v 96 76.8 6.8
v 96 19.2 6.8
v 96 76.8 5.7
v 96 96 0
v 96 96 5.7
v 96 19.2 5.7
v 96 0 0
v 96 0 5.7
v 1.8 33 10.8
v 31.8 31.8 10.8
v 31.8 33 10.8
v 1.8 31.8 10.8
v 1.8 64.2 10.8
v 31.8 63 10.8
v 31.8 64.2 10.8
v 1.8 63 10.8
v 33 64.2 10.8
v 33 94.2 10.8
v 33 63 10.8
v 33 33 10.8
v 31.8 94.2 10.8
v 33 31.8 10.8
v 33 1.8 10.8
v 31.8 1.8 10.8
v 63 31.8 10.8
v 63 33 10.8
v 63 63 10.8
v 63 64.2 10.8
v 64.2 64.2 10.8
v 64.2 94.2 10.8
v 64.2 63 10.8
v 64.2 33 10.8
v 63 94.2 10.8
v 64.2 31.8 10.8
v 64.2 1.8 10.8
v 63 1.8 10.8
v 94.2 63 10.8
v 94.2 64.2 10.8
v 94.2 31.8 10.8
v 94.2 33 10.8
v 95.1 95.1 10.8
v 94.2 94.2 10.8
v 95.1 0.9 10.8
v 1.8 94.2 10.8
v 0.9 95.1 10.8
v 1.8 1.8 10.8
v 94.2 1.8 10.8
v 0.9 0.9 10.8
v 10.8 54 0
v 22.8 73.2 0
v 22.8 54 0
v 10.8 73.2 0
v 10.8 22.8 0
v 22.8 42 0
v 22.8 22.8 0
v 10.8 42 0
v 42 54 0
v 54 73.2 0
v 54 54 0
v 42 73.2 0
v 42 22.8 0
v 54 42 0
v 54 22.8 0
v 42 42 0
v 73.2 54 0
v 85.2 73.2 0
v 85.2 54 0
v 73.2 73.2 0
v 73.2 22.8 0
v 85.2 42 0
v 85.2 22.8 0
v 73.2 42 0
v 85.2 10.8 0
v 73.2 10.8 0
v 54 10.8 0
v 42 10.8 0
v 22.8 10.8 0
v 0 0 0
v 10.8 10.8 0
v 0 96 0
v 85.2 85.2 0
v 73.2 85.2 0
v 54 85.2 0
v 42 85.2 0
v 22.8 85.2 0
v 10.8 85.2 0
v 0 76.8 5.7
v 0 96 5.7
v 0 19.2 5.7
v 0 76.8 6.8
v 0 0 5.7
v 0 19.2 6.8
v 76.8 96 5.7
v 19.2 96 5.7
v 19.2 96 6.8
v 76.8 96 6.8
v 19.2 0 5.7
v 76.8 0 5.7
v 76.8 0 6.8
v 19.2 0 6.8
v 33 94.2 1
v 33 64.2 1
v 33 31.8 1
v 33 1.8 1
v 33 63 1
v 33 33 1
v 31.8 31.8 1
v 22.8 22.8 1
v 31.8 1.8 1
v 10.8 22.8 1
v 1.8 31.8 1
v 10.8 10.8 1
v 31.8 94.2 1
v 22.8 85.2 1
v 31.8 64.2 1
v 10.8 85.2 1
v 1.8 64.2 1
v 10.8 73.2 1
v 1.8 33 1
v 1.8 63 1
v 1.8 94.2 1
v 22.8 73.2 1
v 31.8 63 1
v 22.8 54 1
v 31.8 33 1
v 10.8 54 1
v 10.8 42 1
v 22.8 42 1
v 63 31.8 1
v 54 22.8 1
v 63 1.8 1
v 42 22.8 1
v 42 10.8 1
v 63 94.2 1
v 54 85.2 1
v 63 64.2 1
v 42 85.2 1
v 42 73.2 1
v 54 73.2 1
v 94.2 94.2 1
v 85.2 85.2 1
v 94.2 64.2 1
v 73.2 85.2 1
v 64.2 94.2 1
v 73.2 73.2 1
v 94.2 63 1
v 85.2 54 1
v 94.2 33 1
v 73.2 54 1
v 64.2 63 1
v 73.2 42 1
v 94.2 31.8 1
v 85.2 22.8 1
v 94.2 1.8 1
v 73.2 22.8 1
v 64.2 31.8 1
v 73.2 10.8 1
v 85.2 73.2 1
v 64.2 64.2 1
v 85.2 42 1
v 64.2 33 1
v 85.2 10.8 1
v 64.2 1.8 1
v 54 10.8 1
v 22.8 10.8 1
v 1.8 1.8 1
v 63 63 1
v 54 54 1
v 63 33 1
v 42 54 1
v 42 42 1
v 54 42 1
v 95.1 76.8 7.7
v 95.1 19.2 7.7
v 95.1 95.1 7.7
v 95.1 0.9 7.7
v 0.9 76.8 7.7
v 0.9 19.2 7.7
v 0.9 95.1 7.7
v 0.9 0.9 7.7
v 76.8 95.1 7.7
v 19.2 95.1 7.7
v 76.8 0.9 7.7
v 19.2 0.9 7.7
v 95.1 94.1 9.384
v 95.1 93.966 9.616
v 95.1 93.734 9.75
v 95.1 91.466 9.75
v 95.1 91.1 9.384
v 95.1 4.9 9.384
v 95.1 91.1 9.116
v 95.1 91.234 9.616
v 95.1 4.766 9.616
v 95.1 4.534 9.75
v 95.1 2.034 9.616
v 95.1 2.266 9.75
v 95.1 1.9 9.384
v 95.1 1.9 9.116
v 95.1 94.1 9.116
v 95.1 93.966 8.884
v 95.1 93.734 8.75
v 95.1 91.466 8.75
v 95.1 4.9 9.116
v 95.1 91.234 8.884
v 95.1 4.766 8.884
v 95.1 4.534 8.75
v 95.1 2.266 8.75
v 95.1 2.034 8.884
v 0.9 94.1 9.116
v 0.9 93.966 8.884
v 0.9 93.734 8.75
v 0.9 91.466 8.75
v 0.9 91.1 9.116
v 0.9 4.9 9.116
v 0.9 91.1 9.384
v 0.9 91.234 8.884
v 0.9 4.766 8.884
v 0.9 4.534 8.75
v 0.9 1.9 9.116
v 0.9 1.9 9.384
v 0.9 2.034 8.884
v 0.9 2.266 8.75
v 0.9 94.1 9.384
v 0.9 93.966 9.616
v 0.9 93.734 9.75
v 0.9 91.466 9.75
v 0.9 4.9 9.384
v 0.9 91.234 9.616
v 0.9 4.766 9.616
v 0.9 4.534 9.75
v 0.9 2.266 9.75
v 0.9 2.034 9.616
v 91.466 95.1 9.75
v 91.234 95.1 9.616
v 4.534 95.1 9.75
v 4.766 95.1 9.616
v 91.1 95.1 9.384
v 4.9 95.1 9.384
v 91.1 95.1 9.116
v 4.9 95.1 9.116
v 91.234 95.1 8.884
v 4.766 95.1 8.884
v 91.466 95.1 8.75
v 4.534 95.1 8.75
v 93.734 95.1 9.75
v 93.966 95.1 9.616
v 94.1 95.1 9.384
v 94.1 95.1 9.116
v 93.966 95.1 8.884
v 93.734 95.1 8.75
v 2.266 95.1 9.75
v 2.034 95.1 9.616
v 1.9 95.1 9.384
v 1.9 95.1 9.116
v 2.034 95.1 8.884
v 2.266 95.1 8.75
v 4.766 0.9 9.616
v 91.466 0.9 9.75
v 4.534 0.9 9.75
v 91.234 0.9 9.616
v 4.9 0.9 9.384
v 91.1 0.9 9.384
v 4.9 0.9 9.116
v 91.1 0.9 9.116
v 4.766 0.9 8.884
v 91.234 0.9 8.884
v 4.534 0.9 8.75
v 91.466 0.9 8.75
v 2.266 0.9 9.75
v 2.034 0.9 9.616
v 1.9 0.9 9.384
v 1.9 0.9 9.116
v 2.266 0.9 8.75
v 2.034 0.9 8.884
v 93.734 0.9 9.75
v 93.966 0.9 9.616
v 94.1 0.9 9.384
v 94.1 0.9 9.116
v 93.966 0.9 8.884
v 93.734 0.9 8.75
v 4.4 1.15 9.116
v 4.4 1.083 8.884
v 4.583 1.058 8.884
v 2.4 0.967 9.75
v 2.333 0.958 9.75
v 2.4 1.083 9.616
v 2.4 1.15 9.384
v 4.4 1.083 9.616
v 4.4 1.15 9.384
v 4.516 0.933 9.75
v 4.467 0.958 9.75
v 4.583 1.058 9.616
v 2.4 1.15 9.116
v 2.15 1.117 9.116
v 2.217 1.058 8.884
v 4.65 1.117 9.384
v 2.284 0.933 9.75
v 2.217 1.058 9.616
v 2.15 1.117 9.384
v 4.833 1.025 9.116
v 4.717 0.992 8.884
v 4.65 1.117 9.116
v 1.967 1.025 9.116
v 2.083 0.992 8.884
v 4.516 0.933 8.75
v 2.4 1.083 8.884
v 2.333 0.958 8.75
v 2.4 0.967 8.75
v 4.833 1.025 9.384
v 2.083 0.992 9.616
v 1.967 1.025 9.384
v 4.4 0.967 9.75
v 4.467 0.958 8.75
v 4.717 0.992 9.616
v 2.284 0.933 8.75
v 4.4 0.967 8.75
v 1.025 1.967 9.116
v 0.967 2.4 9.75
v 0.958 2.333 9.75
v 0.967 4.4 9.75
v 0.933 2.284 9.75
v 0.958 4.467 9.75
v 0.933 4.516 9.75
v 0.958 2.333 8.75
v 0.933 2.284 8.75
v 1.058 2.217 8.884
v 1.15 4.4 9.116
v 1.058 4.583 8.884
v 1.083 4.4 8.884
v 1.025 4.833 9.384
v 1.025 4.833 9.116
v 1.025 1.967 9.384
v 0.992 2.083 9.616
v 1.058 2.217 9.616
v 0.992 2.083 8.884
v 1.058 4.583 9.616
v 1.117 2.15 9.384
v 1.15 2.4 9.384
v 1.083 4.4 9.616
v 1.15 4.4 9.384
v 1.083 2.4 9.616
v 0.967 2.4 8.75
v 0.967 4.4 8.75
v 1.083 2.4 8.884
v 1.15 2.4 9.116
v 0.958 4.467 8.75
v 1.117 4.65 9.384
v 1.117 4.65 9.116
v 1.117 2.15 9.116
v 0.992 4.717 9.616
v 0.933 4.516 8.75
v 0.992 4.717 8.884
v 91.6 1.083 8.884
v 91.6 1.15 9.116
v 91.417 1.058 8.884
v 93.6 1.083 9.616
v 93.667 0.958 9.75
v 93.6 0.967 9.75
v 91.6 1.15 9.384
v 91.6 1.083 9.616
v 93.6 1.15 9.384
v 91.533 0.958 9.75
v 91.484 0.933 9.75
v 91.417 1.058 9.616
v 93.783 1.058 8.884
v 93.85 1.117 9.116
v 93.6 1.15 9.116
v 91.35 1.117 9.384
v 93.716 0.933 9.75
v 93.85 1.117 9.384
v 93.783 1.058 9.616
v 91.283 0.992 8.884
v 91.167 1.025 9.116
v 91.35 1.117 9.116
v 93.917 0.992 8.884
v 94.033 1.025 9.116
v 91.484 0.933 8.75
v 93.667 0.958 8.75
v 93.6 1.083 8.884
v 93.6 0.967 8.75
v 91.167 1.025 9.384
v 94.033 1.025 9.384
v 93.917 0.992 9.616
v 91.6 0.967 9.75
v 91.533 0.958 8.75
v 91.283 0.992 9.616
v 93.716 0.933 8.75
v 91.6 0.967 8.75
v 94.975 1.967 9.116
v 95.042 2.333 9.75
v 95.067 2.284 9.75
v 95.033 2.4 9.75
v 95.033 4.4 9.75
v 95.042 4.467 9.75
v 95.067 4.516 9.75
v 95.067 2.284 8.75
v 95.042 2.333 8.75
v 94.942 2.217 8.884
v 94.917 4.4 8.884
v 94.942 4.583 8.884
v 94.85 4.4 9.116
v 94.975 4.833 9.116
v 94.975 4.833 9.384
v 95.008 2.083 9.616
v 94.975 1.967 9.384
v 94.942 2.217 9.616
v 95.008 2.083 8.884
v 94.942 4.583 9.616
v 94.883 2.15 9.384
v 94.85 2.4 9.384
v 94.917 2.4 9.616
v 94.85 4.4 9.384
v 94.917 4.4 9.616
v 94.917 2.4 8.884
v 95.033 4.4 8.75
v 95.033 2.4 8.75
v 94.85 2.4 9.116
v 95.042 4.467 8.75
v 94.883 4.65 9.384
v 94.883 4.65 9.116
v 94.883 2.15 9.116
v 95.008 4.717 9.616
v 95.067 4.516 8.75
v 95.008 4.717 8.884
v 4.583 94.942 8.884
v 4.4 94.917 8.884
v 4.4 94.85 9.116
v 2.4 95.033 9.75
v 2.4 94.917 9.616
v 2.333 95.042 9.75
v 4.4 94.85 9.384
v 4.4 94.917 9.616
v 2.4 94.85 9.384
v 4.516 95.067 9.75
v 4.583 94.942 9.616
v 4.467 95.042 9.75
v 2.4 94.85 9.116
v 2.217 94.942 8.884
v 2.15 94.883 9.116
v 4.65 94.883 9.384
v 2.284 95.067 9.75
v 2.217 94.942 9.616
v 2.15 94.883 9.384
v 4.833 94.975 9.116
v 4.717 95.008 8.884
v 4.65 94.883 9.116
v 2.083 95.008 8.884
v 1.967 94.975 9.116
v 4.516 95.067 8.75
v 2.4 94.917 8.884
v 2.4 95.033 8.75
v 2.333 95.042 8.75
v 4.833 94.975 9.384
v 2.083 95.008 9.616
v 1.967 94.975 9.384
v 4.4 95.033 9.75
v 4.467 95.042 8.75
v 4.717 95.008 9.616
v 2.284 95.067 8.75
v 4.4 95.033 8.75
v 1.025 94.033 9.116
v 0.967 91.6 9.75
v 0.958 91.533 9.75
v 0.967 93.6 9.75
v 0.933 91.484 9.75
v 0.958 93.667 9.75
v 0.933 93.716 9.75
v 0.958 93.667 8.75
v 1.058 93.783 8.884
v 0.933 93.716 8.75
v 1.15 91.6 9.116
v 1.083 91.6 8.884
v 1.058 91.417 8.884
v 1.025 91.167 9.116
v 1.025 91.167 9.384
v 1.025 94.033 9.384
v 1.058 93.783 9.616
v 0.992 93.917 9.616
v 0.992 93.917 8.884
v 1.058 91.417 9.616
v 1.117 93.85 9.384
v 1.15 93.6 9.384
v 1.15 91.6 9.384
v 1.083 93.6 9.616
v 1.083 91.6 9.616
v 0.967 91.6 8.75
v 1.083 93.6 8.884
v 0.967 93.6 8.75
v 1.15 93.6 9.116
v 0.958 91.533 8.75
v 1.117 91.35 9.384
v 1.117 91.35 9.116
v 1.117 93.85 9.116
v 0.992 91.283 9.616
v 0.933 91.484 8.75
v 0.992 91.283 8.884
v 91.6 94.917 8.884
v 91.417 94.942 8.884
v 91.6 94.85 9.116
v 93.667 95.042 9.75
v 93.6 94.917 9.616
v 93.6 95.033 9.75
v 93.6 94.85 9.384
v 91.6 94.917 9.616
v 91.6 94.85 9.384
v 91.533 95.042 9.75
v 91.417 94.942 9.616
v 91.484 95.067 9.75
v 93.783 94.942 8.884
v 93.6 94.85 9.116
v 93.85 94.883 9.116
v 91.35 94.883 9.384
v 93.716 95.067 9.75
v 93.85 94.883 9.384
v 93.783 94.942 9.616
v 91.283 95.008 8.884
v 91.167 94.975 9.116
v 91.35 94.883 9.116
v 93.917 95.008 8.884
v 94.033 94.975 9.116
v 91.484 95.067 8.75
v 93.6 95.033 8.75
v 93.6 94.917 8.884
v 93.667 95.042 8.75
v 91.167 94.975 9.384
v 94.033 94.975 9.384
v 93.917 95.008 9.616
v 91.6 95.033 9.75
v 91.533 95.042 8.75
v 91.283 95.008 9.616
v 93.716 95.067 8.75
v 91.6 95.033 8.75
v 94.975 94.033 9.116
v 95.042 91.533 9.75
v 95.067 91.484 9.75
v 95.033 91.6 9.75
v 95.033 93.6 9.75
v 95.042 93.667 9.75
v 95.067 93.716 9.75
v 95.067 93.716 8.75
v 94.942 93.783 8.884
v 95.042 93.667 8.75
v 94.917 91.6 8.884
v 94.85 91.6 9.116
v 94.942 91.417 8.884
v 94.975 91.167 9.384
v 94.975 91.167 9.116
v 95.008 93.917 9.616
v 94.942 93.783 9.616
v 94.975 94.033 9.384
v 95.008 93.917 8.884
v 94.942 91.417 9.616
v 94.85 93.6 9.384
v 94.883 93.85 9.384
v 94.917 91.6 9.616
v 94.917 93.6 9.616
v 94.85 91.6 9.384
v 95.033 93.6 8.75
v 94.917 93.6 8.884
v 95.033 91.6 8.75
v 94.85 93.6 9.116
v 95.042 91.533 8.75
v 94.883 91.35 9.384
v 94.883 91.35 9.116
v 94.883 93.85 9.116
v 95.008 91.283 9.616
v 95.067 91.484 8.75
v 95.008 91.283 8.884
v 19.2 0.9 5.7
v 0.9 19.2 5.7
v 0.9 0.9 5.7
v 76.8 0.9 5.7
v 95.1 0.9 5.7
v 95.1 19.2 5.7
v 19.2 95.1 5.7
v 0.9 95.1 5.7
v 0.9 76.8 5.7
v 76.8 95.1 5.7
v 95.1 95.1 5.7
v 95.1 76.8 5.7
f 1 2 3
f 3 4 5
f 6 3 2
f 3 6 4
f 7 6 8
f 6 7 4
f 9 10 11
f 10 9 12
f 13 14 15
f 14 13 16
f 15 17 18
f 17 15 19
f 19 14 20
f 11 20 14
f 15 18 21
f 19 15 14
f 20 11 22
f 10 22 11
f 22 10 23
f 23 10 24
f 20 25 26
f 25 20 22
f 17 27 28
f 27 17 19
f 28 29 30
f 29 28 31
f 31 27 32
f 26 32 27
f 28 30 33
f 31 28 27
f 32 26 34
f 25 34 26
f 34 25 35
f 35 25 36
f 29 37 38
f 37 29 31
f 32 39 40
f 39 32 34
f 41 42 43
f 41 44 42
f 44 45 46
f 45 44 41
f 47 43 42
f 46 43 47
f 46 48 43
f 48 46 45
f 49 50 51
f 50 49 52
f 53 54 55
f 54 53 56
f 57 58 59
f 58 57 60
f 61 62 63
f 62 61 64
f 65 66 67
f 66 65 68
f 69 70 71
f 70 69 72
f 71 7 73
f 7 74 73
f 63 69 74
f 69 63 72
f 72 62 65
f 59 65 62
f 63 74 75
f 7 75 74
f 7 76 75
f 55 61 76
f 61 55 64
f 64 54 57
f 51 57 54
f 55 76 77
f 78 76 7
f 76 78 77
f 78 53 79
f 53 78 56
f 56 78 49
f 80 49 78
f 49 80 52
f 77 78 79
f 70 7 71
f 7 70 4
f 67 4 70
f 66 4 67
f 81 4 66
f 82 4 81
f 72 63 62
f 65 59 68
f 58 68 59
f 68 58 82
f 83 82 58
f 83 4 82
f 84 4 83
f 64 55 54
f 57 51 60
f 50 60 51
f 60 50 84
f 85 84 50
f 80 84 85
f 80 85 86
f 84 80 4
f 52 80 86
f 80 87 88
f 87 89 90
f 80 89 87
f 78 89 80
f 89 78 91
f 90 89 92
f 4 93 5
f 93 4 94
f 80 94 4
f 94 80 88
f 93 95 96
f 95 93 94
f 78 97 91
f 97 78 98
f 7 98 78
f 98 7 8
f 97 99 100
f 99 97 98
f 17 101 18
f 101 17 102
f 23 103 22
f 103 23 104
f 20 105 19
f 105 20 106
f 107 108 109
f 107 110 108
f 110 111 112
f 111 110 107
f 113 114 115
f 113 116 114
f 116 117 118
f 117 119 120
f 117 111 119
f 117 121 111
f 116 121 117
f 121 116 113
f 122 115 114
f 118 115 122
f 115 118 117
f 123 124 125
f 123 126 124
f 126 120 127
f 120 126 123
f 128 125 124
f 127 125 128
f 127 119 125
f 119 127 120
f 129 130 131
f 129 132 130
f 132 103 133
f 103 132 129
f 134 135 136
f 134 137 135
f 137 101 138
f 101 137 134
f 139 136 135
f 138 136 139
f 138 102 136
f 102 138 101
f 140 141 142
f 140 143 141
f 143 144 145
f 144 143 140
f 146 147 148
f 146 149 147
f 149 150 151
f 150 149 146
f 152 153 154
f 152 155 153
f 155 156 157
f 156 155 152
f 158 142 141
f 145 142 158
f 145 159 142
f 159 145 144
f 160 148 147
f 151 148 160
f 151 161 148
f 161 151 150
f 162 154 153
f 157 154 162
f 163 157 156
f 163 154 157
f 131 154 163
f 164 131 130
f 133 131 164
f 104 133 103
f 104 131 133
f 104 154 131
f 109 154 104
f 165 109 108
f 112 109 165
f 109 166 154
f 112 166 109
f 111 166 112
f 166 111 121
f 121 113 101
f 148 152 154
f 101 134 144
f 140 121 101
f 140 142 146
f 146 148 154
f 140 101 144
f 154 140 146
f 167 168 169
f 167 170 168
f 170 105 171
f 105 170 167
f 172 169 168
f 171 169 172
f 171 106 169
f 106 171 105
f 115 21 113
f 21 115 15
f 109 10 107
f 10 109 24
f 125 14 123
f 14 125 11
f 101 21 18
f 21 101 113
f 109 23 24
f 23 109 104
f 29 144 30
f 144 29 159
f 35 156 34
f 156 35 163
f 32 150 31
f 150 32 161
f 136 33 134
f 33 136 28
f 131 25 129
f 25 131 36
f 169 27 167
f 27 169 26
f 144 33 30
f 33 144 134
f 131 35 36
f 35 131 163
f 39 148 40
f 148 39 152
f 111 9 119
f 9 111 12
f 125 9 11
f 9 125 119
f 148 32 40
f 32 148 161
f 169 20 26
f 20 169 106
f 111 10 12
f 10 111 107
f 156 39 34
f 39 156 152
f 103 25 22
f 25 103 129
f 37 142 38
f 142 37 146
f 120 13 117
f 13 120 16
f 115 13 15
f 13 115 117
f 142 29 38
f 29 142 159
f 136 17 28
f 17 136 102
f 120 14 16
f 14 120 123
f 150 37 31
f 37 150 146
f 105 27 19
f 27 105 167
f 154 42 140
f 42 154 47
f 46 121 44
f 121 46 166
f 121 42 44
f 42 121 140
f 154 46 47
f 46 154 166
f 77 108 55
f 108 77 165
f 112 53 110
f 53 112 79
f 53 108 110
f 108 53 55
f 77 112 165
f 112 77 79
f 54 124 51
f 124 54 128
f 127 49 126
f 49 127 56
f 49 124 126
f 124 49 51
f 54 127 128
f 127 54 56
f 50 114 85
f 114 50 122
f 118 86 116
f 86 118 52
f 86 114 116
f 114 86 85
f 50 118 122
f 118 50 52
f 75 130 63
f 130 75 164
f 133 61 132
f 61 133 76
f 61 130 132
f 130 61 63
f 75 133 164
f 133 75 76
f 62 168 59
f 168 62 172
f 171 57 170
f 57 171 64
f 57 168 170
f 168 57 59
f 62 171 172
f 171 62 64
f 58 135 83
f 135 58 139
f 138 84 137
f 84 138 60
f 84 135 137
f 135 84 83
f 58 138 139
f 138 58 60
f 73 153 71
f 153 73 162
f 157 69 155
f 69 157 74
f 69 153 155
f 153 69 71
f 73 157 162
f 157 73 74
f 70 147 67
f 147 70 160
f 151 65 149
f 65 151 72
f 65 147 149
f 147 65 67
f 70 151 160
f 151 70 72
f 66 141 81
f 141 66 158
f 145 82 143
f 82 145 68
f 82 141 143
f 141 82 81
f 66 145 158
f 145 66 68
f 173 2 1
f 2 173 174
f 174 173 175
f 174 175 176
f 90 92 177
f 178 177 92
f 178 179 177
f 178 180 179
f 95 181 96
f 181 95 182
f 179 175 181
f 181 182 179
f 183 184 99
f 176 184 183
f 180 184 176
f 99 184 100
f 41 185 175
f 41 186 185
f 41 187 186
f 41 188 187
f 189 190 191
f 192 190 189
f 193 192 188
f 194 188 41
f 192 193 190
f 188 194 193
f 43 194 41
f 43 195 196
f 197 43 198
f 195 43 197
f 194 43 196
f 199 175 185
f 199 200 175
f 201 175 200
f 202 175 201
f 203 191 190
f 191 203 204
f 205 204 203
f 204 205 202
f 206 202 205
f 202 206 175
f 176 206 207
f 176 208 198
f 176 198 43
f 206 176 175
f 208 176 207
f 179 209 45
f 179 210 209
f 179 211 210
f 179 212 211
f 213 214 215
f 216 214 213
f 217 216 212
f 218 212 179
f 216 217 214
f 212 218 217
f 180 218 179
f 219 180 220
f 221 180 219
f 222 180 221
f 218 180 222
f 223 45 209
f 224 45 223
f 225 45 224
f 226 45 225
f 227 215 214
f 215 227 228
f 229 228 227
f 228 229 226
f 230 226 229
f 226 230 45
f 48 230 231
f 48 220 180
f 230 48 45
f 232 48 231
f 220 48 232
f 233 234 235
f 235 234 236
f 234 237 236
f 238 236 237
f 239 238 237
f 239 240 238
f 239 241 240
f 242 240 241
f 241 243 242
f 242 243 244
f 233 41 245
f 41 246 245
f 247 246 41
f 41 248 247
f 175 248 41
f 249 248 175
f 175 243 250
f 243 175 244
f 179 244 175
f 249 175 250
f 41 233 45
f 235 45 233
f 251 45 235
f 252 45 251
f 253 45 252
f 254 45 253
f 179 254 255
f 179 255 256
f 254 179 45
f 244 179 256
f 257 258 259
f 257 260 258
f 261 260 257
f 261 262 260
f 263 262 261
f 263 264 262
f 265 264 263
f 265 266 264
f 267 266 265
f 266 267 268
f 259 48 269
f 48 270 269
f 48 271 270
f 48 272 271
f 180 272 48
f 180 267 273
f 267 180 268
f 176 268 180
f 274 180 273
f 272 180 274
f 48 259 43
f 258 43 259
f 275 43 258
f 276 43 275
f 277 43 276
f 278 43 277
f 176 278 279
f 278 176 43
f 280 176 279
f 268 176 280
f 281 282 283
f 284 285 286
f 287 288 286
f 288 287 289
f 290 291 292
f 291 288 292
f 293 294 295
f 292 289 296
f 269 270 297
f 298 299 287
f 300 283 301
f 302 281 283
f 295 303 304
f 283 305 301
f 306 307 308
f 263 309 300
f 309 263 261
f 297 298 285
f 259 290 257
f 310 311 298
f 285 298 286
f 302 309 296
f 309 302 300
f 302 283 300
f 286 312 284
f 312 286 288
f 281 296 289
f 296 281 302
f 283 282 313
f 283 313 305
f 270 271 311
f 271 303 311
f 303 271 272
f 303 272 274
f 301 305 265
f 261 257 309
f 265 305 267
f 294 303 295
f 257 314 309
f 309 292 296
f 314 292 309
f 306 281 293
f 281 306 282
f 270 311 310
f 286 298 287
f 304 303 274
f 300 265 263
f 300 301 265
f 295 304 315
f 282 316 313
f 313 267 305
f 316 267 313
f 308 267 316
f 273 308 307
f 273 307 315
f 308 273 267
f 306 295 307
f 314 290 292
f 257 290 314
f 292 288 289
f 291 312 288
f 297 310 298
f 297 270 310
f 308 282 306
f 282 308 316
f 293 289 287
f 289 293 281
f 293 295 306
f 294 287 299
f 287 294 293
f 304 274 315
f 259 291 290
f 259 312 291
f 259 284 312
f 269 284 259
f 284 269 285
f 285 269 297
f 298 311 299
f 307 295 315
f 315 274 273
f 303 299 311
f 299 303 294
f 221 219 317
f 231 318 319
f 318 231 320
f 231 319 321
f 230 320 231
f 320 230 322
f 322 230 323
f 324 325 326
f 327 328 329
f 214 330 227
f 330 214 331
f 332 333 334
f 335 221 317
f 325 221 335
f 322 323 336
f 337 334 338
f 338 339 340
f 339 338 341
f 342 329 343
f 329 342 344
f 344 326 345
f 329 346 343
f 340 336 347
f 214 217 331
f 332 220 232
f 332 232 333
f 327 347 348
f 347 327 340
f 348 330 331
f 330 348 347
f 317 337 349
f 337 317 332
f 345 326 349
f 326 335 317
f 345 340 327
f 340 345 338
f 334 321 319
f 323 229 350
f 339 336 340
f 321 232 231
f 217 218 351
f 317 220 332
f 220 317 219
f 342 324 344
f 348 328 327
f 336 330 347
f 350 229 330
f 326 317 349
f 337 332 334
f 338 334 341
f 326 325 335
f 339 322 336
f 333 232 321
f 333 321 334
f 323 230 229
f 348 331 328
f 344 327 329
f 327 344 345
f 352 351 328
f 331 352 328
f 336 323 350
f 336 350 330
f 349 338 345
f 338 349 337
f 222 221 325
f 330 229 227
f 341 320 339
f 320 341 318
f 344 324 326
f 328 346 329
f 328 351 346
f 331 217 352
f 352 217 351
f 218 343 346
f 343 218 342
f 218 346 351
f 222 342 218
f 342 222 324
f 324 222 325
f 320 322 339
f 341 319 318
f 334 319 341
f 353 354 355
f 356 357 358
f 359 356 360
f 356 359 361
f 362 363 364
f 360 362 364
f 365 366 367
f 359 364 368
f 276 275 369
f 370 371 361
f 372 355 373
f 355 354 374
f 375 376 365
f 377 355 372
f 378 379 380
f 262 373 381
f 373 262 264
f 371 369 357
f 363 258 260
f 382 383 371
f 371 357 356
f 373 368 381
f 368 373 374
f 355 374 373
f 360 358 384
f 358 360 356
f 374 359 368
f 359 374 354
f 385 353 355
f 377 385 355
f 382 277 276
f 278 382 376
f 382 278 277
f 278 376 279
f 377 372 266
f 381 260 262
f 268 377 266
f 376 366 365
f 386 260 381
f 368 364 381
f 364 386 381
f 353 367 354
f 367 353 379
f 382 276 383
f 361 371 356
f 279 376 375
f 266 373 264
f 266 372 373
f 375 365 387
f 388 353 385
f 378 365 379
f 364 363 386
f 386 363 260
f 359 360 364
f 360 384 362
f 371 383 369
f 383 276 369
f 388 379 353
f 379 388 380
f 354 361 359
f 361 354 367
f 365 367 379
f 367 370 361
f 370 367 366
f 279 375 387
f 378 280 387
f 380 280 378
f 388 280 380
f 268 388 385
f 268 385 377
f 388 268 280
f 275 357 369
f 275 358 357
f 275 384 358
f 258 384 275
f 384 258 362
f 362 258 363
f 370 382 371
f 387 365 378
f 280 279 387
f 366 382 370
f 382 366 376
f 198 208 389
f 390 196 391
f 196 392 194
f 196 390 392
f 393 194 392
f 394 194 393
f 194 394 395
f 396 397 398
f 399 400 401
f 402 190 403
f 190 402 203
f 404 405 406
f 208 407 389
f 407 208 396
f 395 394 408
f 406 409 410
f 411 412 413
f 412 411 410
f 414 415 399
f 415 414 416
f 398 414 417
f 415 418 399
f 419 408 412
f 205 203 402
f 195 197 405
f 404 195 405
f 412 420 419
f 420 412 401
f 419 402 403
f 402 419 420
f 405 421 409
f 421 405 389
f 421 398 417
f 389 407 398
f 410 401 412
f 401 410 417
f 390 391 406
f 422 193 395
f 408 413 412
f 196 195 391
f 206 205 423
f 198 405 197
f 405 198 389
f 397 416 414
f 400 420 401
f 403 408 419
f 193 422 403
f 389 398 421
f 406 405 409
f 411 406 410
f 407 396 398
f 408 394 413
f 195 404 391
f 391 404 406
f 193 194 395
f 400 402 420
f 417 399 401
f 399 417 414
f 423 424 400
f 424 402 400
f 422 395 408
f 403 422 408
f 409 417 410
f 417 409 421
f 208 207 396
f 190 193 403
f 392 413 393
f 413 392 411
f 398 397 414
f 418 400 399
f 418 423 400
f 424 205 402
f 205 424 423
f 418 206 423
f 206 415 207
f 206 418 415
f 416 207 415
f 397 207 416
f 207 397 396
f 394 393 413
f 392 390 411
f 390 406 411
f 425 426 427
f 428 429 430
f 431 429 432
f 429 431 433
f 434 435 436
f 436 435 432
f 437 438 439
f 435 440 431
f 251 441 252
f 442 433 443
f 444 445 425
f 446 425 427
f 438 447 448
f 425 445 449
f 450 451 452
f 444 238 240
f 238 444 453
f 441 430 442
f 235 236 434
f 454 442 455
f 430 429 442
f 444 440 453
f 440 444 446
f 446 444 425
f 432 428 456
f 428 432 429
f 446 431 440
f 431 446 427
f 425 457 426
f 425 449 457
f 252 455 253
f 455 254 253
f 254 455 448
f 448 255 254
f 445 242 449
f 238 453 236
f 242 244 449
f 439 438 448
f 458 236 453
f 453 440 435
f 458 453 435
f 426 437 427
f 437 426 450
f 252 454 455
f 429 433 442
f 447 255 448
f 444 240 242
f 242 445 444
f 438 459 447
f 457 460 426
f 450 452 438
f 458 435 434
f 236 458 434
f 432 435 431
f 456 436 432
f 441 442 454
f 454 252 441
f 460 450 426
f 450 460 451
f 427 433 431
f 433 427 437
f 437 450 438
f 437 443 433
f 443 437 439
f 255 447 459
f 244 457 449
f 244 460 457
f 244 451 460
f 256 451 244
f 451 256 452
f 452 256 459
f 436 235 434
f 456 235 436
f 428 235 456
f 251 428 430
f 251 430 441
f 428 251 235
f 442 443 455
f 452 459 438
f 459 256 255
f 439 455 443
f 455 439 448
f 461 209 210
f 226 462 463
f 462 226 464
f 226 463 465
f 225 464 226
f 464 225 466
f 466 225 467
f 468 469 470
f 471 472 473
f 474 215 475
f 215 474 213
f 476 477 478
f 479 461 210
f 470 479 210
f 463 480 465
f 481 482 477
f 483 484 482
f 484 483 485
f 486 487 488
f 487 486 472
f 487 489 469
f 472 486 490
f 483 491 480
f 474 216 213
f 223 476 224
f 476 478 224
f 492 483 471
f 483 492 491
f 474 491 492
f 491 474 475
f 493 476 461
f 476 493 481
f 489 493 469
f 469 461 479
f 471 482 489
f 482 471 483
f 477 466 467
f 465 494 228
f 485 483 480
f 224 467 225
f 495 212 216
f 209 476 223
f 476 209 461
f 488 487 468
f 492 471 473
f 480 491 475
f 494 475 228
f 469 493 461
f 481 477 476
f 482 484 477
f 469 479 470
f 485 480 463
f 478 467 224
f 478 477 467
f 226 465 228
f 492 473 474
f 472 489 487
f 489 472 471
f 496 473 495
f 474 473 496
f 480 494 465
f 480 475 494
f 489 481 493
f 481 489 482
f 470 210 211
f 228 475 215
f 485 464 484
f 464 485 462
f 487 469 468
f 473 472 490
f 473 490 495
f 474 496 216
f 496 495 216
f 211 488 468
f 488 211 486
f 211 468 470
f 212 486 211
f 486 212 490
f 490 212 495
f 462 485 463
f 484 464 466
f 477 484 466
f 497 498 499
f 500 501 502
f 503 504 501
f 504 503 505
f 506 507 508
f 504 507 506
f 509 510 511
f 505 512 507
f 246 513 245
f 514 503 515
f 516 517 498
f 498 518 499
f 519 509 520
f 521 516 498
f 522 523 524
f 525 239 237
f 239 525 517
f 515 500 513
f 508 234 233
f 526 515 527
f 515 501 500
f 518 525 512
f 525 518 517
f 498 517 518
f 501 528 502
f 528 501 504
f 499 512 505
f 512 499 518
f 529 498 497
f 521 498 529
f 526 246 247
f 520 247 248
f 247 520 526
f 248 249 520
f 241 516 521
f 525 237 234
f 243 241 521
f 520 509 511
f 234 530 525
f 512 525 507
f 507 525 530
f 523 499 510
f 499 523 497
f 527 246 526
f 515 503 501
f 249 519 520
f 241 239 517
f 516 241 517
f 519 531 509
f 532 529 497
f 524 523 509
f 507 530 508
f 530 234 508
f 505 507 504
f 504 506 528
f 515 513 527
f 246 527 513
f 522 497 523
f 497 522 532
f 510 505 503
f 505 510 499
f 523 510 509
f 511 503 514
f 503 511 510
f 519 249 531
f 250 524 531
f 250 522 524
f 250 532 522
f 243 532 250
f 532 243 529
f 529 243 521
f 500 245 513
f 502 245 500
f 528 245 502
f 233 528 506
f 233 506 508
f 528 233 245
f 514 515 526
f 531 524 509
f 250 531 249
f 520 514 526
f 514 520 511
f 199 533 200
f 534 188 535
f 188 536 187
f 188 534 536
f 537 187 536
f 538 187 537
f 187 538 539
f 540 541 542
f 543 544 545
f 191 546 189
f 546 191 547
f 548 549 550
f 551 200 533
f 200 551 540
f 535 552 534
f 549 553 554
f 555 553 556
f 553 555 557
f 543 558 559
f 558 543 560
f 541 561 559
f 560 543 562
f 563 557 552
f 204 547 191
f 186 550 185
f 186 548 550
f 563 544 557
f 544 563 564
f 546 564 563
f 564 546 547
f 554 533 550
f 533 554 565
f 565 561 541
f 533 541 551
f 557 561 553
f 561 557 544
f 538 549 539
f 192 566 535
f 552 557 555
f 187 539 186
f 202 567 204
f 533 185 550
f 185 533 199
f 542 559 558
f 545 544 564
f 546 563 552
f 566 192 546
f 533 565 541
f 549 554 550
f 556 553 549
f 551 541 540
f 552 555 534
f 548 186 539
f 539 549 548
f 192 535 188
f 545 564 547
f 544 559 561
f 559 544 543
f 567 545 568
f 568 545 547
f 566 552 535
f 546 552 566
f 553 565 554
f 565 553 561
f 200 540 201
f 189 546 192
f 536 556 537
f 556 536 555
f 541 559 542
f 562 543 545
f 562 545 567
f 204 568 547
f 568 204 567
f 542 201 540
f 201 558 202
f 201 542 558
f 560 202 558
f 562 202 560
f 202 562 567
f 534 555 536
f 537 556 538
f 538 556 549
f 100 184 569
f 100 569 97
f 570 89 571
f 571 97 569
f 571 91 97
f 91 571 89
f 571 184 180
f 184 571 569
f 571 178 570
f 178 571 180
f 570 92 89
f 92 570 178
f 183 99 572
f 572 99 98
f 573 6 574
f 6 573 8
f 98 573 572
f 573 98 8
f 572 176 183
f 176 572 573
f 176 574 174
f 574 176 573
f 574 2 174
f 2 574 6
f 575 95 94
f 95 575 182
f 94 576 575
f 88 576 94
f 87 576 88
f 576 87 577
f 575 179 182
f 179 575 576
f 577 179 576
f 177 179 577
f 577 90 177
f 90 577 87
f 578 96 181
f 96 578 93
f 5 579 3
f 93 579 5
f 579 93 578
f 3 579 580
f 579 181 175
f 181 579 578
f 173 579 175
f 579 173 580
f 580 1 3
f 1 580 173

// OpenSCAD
insert_font = "Futura:style=Medium";
include <../../The-Boardgame-Insert-Toolkit/boardgame_insert_toolkit_lib.2.scad>;
include <../../BFD-Insert-Extensions/InsertExtensions.scad>;

$fn = 100;


// Used to visualize how all of the boxes fit together. 
//g_b_visualization = true;          
        
// this is the outer wall thickness. 
//Default = 1.5mm
g_wall_thickness = 1.8;
g_lid_thickness = 1.8;
g_min_bottom_thickness = 1.0;


// The tolerance value is extra space put between planes of the lid and box that fit together.
// Increase the tolerance to loosen the fit and decrease it to tighten it.
//
// Note that the tolerance is applied exclusivelysto the lid.
// So if the lid is too tight or too loose, change this value ( up for looser fit, down for tighter fit ) and 
// you only need to reprint the lid.
// 
// The exception is the stackable box, where the bottom of the box is the lid of the box below,
// in which case the tolerance also affects that box bottom.
//
g_tolerance = 0.15;
g_detent_thickness = 0.25;

// This adjusts the position of the lid detents downward. 
// The larger the value, the bigger the gap between the lid and the box.
g_tolerance_detents_pos = 0.1;


// Focus on one box
g_isolated_print_box = "point6"; 
g_b_print_lid = false;
g_b_print_box = true; 


    
// ssence cards x:61 y:92 z:10
function point6test() = gridBox( "point6", [3,3], ["This","Is A","Test"], 10, 0, 30, 30, 10,cutout=true,thin_bottom=true,padding = [1.2,1.2]);




  
data =
[ 
    point6test(),
];

//echo(data);
MakeAll();
